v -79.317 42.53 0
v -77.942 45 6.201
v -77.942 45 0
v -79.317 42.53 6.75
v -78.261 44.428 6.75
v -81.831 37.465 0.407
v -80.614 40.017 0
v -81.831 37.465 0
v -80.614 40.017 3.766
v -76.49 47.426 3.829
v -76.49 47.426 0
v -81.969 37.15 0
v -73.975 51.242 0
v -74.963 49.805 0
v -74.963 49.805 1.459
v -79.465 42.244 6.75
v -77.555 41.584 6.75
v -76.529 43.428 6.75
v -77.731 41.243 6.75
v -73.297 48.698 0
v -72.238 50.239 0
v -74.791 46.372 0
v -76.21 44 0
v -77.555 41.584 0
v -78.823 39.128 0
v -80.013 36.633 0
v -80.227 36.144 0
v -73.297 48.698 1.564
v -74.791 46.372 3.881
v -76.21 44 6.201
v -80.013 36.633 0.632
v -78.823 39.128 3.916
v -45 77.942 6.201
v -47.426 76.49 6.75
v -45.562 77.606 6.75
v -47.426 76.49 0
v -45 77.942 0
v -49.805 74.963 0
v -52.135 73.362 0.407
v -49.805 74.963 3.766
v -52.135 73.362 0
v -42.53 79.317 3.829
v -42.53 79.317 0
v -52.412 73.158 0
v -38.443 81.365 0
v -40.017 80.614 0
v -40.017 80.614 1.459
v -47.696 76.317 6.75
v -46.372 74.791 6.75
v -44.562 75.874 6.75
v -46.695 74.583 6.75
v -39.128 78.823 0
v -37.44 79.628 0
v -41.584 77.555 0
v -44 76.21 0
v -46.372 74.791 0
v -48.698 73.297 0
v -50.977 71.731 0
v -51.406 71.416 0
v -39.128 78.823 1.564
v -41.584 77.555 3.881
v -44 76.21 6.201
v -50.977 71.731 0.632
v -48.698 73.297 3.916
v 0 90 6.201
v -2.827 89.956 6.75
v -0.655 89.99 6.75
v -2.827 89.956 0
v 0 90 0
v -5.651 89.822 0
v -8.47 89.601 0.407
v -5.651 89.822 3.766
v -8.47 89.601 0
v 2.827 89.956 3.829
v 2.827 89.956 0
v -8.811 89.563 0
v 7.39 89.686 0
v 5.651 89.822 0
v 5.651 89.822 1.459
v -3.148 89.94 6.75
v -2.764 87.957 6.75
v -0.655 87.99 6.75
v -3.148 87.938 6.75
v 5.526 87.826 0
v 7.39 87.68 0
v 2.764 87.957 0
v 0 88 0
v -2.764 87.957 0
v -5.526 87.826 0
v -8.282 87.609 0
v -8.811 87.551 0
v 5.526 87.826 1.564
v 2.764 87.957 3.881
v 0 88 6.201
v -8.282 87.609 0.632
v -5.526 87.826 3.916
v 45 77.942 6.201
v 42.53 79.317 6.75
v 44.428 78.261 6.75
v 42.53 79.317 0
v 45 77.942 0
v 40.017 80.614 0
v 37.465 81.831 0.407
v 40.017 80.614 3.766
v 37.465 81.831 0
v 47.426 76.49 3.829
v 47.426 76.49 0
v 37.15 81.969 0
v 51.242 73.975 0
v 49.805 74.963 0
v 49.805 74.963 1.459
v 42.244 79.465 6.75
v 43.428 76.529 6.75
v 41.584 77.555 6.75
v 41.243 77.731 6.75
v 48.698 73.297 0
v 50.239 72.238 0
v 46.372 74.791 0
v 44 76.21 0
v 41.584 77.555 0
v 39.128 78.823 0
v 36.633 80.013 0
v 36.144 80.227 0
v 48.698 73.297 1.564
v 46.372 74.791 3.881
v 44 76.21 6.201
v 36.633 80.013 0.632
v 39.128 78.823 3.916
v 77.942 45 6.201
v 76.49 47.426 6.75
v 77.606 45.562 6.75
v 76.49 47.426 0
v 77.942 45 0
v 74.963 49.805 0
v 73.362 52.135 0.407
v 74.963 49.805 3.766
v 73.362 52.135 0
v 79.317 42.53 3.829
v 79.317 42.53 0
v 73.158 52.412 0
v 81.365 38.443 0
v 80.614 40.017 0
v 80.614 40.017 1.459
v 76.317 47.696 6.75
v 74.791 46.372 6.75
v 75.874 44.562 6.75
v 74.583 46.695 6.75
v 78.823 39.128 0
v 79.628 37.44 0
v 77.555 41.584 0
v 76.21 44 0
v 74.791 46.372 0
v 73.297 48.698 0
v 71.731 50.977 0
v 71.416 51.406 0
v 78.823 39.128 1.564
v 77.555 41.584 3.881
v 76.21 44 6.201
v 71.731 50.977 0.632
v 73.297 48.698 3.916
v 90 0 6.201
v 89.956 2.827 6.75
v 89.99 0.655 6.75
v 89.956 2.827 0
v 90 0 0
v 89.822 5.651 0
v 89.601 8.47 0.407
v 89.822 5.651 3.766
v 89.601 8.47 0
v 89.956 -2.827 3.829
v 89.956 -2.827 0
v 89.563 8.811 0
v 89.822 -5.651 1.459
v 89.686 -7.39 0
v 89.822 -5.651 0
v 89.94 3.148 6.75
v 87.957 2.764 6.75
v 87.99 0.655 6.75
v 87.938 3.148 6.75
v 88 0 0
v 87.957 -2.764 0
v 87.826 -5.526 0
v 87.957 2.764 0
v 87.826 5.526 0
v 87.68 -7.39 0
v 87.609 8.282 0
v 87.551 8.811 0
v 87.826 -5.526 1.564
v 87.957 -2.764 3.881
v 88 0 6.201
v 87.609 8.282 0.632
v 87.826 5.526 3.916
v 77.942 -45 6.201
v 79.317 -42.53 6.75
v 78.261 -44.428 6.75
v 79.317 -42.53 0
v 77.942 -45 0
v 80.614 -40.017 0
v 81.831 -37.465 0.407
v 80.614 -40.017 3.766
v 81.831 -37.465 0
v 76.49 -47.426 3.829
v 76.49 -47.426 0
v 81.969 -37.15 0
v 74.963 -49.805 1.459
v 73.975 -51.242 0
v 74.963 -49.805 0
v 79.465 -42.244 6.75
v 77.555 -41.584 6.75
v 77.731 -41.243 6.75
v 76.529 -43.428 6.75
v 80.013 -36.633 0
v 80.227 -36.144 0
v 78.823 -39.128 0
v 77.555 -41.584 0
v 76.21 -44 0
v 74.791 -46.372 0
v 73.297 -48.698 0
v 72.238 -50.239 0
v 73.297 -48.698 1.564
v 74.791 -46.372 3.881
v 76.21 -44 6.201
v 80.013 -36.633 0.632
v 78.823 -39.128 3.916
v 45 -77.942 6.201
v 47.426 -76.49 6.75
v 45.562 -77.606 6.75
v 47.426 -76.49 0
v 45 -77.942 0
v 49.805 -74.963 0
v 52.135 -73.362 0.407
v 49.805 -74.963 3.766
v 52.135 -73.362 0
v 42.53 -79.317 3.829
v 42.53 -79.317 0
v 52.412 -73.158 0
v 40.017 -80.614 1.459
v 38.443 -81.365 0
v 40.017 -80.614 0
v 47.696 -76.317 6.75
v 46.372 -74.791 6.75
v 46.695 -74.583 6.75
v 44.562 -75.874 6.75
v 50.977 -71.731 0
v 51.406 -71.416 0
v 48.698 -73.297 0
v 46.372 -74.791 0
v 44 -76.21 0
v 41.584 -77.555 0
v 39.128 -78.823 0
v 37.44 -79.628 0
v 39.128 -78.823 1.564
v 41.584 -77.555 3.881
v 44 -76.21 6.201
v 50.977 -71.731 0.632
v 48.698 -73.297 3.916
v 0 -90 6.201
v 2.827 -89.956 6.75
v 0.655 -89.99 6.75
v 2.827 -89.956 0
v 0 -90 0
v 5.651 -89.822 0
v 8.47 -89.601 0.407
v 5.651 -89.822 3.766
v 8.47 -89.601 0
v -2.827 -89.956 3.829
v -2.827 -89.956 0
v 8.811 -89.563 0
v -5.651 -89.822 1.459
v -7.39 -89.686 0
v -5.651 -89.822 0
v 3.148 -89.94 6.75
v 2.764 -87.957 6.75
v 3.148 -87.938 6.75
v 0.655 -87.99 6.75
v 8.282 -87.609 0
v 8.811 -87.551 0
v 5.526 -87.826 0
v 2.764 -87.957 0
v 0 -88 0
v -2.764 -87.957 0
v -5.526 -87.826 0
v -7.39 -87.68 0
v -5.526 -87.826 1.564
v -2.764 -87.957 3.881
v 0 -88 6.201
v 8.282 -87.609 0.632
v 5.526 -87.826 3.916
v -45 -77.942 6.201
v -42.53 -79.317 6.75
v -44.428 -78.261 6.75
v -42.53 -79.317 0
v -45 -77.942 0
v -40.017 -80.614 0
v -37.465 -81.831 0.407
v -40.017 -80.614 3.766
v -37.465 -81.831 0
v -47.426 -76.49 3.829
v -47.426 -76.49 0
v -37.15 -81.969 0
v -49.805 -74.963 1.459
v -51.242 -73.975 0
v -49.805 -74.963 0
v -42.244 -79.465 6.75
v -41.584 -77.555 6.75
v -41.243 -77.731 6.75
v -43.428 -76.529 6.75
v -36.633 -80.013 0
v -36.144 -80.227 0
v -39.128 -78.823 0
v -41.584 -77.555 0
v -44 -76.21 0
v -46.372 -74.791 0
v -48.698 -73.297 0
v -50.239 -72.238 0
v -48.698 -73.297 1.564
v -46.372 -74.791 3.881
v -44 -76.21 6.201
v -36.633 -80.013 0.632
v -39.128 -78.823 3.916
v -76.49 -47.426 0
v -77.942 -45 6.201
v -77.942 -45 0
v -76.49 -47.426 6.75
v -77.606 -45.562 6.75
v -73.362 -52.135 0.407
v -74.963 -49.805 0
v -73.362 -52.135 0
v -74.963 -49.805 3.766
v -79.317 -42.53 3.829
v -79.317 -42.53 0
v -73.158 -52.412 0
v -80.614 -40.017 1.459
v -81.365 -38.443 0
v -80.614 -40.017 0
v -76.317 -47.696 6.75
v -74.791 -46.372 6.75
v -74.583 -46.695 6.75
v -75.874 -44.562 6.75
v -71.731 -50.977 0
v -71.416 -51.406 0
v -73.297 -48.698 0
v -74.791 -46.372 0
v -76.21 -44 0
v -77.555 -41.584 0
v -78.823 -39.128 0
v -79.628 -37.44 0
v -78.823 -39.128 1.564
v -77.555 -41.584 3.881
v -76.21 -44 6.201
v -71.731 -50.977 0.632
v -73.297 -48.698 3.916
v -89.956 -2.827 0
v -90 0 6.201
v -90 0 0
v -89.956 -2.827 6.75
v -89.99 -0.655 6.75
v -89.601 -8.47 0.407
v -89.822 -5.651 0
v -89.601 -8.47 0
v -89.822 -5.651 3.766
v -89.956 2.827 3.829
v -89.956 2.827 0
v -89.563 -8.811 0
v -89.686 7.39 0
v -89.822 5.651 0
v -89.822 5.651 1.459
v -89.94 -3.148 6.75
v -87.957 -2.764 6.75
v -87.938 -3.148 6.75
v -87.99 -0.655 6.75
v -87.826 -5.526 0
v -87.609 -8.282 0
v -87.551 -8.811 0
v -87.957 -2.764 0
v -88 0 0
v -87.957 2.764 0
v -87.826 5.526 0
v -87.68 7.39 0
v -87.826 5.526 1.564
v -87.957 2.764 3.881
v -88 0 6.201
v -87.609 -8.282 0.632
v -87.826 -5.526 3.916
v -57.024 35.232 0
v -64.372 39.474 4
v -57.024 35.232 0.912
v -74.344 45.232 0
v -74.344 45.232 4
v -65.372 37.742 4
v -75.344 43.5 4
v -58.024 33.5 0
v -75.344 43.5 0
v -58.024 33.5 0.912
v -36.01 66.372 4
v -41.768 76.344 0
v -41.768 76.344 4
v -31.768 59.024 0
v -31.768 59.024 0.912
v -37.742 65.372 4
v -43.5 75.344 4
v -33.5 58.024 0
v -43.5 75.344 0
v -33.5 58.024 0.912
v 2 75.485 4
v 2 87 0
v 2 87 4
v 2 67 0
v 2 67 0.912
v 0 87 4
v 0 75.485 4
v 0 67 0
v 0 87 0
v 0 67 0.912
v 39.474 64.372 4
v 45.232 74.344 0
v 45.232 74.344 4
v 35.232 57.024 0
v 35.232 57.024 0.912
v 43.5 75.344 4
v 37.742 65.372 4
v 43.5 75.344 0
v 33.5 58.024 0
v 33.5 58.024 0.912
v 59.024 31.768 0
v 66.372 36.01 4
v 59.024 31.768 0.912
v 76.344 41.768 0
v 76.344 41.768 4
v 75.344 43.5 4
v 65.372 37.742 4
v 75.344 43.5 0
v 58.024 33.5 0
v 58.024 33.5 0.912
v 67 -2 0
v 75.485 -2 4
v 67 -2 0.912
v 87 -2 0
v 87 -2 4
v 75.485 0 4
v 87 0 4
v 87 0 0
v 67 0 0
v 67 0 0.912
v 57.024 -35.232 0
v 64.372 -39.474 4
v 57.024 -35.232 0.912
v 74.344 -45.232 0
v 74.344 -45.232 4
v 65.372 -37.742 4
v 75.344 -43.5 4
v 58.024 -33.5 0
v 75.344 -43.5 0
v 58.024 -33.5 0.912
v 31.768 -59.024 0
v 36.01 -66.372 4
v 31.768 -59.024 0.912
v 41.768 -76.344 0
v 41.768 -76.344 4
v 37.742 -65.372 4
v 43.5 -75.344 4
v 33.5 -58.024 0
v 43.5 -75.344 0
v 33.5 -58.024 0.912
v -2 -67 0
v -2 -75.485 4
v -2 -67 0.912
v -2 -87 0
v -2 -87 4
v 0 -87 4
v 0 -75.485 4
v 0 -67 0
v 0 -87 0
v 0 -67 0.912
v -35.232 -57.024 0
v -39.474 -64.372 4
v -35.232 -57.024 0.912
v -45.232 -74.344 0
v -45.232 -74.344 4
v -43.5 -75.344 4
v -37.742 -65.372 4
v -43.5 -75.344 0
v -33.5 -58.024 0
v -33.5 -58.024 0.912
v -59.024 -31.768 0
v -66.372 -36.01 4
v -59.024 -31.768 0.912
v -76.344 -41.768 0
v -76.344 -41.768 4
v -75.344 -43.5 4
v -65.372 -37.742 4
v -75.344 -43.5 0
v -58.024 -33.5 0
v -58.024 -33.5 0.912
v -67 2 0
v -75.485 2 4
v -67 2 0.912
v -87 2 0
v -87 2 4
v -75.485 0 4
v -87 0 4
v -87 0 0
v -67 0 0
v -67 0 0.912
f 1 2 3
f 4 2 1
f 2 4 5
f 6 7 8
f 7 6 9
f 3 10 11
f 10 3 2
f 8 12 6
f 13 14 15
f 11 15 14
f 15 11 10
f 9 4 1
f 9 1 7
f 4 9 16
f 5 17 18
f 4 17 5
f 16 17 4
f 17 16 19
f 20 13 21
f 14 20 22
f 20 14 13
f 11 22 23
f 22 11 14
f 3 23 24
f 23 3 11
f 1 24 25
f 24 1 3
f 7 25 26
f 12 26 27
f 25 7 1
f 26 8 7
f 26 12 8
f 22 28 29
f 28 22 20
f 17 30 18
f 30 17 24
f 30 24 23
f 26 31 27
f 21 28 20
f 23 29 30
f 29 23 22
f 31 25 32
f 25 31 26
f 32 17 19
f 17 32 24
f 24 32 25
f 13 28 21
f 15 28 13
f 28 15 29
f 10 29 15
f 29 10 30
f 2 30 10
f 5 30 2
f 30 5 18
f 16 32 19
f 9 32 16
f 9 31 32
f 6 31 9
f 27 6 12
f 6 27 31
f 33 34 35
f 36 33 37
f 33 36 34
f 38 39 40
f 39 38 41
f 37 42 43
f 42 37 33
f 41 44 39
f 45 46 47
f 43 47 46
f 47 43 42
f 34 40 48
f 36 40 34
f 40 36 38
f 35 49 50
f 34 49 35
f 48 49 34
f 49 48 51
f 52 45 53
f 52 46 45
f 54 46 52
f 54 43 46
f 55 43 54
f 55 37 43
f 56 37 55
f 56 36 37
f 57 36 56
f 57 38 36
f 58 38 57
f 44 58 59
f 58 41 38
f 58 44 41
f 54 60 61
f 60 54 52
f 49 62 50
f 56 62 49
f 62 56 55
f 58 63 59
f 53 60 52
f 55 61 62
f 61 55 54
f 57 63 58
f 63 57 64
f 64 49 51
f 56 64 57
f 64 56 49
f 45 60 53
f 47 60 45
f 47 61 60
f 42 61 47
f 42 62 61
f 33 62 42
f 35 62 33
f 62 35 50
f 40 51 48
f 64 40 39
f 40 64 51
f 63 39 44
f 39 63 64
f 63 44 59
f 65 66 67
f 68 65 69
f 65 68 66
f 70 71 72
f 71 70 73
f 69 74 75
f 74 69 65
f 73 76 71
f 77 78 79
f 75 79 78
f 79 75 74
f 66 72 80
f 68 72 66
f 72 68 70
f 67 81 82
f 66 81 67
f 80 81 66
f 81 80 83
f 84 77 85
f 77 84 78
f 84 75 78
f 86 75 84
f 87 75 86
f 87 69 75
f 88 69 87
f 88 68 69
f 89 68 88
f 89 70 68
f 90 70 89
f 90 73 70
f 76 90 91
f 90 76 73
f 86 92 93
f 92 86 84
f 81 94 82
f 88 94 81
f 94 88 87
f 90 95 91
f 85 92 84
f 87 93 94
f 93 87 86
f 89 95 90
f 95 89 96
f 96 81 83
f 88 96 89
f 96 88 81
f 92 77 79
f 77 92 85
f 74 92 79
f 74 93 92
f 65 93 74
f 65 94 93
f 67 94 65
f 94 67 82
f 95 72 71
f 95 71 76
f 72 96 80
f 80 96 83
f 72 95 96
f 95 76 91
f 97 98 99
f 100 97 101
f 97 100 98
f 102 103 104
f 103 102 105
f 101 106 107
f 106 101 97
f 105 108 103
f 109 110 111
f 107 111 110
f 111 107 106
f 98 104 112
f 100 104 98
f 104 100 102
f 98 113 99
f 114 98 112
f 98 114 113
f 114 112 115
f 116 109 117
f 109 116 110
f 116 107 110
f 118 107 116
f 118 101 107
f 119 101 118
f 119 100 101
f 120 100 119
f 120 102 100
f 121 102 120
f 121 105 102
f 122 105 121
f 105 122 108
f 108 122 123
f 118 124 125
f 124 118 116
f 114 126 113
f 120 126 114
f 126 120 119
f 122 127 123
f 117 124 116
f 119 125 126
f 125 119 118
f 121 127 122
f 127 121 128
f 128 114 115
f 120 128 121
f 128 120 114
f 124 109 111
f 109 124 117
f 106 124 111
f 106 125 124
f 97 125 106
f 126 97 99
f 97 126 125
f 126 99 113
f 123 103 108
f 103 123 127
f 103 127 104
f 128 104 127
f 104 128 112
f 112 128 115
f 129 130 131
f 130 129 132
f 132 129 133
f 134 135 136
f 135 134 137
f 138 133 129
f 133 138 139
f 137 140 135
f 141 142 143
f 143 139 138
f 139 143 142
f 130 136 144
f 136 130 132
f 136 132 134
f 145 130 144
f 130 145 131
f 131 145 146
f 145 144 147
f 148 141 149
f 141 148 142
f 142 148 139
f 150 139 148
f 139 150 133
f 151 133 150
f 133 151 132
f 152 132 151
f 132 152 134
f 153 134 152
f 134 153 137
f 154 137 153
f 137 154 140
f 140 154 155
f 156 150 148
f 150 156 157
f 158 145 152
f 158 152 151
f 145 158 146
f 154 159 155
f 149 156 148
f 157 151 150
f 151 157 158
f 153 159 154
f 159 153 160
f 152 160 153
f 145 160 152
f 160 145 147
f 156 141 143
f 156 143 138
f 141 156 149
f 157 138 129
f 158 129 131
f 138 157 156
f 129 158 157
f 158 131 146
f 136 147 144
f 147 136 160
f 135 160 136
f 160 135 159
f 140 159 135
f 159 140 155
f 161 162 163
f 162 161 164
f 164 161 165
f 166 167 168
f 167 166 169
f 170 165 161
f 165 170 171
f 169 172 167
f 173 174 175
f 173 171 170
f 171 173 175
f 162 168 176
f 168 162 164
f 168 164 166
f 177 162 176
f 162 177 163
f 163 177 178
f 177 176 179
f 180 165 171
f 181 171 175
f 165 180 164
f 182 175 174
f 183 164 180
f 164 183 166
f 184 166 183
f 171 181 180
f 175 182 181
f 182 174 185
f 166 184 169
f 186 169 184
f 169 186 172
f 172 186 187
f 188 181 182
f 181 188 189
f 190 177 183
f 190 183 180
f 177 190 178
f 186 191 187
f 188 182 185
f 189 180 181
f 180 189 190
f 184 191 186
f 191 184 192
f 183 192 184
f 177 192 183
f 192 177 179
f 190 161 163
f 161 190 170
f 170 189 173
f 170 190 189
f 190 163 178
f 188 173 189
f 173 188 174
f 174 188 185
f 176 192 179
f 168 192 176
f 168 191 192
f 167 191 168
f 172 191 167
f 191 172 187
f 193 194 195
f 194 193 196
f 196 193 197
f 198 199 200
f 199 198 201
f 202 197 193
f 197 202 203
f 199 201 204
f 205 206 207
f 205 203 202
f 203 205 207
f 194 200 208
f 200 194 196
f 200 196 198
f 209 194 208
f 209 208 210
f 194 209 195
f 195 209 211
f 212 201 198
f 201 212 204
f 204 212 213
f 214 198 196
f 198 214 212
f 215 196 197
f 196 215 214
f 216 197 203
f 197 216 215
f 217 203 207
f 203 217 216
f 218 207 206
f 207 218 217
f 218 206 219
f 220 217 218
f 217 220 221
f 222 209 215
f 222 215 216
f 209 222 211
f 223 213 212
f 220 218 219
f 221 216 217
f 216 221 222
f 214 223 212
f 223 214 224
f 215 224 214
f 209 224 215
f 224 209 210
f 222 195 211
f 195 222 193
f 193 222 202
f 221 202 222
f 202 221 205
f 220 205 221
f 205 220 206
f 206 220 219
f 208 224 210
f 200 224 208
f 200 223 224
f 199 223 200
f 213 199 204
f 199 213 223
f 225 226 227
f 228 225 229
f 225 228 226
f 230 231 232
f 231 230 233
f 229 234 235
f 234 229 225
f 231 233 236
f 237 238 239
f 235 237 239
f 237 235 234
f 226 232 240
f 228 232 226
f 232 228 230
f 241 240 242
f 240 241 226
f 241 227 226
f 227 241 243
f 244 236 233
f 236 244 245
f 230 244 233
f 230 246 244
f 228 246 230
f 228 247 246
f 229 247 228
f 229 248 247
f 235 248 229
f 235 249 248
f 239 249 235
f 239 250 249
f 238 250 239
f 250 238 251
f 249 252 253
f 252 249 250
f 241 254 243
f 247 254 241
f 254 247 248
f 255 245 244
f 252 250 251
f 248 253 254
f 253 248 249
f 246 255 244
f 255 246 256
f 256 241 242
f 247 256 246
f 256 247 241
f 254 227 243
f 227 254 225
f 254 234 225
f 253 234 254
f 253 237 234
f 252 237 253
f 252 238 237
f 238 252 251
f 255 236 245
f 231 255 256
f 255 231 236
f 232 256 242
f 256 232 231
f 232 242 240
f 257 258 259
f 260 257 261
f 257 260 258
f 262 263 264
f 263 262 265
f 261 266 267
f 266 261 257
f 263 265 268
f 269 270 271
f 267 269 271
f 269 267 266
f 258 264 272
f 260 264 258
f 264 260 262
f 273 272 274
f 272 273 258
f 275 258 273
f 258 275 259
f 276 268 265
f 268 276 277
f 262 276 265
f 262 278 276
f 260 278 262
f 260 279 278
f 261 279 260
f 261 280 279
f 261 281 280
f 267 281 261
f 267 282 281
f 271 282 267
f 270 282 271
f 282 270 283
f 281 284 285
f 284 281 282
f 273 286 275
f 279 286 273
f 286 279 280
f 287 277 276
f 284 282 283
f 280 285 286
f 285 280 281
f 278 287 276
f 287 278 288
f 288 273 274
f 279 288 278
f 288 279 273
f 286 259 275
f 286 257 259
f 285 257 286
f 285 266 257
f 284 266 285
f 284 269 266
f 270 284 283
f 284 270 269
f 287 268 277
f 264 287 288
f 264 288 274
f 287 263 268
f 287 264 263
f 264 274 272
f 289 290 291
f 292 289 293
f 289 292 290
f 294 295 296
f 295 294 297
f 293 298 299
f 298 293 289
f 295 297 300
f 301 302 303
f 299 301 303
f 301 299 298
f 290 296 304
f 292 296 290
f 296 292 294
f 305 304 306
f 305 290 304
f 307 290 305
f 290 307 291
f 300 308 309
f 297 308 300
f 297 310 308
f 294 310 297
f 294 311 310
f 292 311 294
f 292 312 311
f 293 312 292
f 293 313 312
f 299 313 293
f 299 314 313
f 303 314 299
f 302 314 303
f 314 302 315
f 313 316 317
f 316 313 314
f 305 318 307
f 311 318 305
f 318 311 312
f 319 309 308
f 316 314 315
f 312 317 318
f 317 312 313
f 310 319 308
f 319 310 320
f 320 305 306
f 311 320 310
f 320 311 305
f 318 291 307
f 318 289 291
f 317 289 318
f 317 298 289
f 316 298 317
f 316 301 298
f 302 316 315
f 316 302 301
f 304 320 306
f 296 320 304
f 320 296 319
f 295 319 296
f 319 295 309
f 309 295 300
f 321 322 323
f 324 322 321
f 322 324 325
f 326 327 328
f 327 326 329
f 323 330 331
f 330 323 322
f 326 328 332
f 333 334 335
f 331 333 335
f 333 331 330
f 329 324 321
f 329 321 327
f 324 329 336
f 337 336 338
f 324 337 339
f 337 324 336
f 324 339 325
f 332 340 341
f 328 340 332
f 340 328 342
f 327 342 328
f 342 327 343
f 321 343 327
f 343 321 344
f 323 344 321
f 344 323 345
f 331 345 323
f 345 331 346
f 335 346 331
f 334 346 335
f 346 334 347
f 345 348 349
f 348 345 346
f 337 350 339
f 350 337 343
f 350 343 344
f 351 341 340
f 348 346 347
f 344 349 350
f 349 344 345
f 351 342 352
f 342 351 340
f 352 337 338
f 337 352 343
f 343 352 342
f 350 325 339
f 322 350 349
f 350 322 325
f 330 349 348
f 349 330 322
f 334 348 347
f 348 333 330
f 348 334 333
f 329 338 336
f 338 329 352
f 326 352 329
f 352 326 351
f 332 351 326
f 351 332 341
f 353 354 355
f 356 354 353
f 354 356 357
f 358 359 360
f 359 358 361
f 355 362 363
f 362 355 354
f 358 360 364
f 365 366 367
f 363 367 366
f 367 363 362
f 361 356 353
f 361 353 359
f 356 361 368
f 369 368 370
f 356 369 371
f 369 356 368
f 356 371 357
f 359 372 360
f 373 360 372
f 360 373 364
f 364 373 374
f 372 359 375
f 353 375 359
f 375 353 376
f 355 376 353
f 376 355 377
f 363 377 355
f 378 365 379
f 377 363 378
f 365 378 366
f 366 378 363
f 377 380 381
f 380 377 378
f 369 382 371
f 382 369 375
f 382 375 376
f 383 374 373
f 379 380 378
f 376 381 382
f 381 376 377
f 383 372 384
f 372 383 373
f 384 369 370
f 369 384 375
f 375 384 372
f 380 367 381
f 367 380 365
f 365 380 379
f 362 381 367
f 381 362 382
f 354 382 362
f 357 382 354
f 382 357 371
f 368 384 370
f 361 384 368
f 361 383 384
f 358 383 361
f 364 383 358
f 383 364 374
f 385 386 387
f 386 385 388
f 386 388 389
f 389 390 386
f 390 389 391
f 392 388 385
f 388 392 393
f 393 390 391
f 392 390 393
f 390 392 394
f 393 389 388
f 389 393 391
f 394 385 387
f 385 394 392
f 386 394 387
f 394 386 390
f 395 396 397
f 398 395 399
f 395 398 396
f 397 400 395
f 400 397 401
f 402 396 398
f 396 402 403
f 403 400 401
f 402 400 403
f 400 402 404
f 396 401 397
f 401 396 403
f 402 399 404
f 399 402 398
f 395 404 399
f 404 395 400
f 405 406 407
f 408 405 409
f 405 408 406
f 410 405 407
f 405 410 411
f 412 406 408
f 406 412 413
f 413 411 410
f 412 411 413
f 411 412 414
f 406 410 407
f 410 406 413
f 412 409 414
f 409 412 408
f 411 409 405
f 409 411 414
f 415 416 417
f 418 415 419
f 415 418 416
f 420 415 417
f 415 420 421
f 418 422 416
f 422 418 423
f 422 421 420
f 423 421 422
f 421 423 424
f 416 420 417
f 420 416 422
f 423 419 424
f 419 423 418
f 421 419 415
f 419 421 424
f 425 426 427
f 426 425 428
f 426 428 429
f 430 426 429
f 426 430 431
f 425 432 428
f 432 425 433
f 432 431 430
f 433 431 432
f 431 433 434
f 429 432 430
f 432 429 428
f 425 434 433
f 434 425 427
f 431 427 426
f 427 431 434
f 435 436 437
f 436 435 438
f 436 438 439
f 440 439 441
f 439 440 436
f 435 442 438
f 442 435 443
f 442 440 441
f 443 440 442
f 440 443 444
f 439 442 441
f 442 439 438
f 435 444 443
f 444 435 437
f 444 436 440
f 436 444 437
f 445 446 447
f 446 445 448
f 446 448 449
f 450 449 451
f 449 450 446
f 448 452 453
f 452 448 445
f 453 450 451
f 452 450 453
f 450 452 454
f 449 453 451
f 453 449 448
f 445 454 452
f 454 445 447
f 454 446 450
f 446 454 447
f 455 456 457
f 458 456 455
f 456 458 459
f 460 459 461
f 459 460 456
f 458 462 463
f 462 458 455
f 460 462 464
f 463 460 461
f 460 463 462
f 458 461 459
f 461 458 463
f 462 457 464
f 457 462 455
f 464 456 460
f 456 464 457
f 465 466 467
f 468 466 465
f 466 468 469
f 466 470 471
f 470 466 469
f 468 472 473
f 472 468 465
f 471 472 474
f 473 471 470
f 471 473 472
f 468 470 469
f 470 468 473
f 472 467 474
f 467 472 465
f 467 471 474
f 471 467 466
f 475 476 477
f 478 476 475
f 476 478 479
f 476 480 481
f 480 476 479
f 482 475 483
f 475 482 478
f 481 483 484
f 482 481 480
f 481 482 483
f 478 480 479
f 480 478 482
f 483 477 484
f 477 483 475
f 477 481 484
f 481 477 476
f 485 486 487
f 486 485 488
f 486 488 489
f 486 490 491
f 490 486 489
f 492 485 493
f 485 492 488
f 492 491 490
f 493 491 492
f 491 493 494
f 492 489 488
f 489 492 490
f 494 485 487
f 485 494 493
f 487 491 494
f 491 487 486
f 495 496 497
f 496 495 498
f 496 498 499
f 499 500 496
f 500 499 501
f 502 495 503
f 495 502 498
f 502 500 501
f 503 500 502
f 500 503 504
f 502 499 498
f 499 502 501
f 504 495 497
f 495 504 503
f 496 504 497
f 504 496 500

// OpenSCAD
// file: utils.scad
module clock_words(
    from_edge=4,
    letter_depth=3.25, //disc_thickness+1,
    center_offset=0,
    font_size=11.5,
    words
) {
    for (i = [0 : len(words) - 1]) {
        angle = (i + 1) * 360 / len(words);
        rotate(90 - angle) {
            translate([-clock_r + from_edge, center_offset,-0.5]) {
                linear_extrude(height=letter_depth) {
                    text(words[i], size=font_size, font="Gunplay");
                }
            }
        }
    }
}

module fillet(r) {
    translate([r / 2, r / 2, 0]) difference() {
        square([r + 0.01, r + 0.01], center = true);
        translate([r/2, r/2]) circle(r = r, center = true);
    }
}

module rounded_rect(w=51, l=21, h=2.25, r=6) {
	translate([r, r, 0]) linear_extrude(height = h) minkowski() {
		square([w-r*2, l-r*2]);
		circle(r);
	}
}

module ring(r1=104, r2=101, h=2.25) {
    difference() {
        cylinder(h, r1, r1, $fn = 200);
        translate([0,0,-0.5]) cylinder(h + 1, r2, r2, $fn = 200);
    }
}

module disc_with_pattern(r=104, h=2.25) {
	difference() {
		cylinder(h, r1=r, r2=r, $fn = 200);
		translate([-r-1,-r-4,2]) scale(3) linear_extrude(height = h, center = true, convexity = 10) {
			// TODO: figure out pattern from radius
			for (k = [0:5:r / 1.4]) {
				for (i = [0:3:r / 1.4]) {
				   translate([k, i]) import (file = "egypt pattern.dxf");
				}
				for (j = [0:3:r / 1.4]) {
					   translate([k + 2.5, j+1.5]) import (file = "egypt pattern.dxf");
				}
			}
		}
	}
}

module disc_with_slots(r=104, h=2.25, slots=12, slot_width=100, slot_r=5, offset=[50,0,-0.5]){
    difference() {
        cylinder(h, r, r, $fn=300);

        // see-through slots
        for (i = [0 : slots - 1]) {
            angle = (i + 1) * 360 / slots;
            rotate(90 - angle) {
                translate(offset) {
                    linear_extrude(height=h + 1) {
                        hull() {
                            translate([0, slot_r]) circle(slot_r);
                            translate([slot_width - (slot_r*2), slot_r]) circle(slot_r);
                        }
                    }
                }
            }
        }
    }
}

module rotate_360(count = 12) {
	for (i = [0 : count - 1]) {
		angle = (i + 1) * 360 / count;
		rotate(90 - angle) {
			children();
		}
	}
}

module straight_nub(w = 2, h = 4, l = 10) {
	difference() {
		cube([w,l*2,h]);
		 rotate([45,0,0])cube([w+1,l*2,h]);
	}
}

module circular_nub(r = 100, w = 2, h = 6.75) {
	intersection() {
		ring(r,r-w,h);
		rotate([0,40,0]) translate([-h, r - (h*2), -h-4.5]) cube([40, w*8, w*8]);
	}
}


//rounded_rect(50, 100, 4, 6);
//cube([50, 100, 4]);
// main file
include <utils.scad>

module straight_nub(w = 2, h = 4, l = 10) {
	difference() {
		cube([w,l*2,h]);
		 translate([-0.5,-8,-2]) rotate([20,0,0])cube([w+1,l*2,h]);
	}
}

module circular_nub(r = 100, w = 2, h = 6.75) {
	intersection() {
		ring(r,r-w,h);
		rotate([0,40,0]) translate([-h, r - (h*2), -h-4.5]) cube([40, w*8, w*8]);
	}
}

// rotate_360(12) {
	// circular_nub();
// }
rotate_360(12) {
	circular_nub(90);
}

rotate_360(12) {
	translate([0, 67, 0]) straight_nub();
}
